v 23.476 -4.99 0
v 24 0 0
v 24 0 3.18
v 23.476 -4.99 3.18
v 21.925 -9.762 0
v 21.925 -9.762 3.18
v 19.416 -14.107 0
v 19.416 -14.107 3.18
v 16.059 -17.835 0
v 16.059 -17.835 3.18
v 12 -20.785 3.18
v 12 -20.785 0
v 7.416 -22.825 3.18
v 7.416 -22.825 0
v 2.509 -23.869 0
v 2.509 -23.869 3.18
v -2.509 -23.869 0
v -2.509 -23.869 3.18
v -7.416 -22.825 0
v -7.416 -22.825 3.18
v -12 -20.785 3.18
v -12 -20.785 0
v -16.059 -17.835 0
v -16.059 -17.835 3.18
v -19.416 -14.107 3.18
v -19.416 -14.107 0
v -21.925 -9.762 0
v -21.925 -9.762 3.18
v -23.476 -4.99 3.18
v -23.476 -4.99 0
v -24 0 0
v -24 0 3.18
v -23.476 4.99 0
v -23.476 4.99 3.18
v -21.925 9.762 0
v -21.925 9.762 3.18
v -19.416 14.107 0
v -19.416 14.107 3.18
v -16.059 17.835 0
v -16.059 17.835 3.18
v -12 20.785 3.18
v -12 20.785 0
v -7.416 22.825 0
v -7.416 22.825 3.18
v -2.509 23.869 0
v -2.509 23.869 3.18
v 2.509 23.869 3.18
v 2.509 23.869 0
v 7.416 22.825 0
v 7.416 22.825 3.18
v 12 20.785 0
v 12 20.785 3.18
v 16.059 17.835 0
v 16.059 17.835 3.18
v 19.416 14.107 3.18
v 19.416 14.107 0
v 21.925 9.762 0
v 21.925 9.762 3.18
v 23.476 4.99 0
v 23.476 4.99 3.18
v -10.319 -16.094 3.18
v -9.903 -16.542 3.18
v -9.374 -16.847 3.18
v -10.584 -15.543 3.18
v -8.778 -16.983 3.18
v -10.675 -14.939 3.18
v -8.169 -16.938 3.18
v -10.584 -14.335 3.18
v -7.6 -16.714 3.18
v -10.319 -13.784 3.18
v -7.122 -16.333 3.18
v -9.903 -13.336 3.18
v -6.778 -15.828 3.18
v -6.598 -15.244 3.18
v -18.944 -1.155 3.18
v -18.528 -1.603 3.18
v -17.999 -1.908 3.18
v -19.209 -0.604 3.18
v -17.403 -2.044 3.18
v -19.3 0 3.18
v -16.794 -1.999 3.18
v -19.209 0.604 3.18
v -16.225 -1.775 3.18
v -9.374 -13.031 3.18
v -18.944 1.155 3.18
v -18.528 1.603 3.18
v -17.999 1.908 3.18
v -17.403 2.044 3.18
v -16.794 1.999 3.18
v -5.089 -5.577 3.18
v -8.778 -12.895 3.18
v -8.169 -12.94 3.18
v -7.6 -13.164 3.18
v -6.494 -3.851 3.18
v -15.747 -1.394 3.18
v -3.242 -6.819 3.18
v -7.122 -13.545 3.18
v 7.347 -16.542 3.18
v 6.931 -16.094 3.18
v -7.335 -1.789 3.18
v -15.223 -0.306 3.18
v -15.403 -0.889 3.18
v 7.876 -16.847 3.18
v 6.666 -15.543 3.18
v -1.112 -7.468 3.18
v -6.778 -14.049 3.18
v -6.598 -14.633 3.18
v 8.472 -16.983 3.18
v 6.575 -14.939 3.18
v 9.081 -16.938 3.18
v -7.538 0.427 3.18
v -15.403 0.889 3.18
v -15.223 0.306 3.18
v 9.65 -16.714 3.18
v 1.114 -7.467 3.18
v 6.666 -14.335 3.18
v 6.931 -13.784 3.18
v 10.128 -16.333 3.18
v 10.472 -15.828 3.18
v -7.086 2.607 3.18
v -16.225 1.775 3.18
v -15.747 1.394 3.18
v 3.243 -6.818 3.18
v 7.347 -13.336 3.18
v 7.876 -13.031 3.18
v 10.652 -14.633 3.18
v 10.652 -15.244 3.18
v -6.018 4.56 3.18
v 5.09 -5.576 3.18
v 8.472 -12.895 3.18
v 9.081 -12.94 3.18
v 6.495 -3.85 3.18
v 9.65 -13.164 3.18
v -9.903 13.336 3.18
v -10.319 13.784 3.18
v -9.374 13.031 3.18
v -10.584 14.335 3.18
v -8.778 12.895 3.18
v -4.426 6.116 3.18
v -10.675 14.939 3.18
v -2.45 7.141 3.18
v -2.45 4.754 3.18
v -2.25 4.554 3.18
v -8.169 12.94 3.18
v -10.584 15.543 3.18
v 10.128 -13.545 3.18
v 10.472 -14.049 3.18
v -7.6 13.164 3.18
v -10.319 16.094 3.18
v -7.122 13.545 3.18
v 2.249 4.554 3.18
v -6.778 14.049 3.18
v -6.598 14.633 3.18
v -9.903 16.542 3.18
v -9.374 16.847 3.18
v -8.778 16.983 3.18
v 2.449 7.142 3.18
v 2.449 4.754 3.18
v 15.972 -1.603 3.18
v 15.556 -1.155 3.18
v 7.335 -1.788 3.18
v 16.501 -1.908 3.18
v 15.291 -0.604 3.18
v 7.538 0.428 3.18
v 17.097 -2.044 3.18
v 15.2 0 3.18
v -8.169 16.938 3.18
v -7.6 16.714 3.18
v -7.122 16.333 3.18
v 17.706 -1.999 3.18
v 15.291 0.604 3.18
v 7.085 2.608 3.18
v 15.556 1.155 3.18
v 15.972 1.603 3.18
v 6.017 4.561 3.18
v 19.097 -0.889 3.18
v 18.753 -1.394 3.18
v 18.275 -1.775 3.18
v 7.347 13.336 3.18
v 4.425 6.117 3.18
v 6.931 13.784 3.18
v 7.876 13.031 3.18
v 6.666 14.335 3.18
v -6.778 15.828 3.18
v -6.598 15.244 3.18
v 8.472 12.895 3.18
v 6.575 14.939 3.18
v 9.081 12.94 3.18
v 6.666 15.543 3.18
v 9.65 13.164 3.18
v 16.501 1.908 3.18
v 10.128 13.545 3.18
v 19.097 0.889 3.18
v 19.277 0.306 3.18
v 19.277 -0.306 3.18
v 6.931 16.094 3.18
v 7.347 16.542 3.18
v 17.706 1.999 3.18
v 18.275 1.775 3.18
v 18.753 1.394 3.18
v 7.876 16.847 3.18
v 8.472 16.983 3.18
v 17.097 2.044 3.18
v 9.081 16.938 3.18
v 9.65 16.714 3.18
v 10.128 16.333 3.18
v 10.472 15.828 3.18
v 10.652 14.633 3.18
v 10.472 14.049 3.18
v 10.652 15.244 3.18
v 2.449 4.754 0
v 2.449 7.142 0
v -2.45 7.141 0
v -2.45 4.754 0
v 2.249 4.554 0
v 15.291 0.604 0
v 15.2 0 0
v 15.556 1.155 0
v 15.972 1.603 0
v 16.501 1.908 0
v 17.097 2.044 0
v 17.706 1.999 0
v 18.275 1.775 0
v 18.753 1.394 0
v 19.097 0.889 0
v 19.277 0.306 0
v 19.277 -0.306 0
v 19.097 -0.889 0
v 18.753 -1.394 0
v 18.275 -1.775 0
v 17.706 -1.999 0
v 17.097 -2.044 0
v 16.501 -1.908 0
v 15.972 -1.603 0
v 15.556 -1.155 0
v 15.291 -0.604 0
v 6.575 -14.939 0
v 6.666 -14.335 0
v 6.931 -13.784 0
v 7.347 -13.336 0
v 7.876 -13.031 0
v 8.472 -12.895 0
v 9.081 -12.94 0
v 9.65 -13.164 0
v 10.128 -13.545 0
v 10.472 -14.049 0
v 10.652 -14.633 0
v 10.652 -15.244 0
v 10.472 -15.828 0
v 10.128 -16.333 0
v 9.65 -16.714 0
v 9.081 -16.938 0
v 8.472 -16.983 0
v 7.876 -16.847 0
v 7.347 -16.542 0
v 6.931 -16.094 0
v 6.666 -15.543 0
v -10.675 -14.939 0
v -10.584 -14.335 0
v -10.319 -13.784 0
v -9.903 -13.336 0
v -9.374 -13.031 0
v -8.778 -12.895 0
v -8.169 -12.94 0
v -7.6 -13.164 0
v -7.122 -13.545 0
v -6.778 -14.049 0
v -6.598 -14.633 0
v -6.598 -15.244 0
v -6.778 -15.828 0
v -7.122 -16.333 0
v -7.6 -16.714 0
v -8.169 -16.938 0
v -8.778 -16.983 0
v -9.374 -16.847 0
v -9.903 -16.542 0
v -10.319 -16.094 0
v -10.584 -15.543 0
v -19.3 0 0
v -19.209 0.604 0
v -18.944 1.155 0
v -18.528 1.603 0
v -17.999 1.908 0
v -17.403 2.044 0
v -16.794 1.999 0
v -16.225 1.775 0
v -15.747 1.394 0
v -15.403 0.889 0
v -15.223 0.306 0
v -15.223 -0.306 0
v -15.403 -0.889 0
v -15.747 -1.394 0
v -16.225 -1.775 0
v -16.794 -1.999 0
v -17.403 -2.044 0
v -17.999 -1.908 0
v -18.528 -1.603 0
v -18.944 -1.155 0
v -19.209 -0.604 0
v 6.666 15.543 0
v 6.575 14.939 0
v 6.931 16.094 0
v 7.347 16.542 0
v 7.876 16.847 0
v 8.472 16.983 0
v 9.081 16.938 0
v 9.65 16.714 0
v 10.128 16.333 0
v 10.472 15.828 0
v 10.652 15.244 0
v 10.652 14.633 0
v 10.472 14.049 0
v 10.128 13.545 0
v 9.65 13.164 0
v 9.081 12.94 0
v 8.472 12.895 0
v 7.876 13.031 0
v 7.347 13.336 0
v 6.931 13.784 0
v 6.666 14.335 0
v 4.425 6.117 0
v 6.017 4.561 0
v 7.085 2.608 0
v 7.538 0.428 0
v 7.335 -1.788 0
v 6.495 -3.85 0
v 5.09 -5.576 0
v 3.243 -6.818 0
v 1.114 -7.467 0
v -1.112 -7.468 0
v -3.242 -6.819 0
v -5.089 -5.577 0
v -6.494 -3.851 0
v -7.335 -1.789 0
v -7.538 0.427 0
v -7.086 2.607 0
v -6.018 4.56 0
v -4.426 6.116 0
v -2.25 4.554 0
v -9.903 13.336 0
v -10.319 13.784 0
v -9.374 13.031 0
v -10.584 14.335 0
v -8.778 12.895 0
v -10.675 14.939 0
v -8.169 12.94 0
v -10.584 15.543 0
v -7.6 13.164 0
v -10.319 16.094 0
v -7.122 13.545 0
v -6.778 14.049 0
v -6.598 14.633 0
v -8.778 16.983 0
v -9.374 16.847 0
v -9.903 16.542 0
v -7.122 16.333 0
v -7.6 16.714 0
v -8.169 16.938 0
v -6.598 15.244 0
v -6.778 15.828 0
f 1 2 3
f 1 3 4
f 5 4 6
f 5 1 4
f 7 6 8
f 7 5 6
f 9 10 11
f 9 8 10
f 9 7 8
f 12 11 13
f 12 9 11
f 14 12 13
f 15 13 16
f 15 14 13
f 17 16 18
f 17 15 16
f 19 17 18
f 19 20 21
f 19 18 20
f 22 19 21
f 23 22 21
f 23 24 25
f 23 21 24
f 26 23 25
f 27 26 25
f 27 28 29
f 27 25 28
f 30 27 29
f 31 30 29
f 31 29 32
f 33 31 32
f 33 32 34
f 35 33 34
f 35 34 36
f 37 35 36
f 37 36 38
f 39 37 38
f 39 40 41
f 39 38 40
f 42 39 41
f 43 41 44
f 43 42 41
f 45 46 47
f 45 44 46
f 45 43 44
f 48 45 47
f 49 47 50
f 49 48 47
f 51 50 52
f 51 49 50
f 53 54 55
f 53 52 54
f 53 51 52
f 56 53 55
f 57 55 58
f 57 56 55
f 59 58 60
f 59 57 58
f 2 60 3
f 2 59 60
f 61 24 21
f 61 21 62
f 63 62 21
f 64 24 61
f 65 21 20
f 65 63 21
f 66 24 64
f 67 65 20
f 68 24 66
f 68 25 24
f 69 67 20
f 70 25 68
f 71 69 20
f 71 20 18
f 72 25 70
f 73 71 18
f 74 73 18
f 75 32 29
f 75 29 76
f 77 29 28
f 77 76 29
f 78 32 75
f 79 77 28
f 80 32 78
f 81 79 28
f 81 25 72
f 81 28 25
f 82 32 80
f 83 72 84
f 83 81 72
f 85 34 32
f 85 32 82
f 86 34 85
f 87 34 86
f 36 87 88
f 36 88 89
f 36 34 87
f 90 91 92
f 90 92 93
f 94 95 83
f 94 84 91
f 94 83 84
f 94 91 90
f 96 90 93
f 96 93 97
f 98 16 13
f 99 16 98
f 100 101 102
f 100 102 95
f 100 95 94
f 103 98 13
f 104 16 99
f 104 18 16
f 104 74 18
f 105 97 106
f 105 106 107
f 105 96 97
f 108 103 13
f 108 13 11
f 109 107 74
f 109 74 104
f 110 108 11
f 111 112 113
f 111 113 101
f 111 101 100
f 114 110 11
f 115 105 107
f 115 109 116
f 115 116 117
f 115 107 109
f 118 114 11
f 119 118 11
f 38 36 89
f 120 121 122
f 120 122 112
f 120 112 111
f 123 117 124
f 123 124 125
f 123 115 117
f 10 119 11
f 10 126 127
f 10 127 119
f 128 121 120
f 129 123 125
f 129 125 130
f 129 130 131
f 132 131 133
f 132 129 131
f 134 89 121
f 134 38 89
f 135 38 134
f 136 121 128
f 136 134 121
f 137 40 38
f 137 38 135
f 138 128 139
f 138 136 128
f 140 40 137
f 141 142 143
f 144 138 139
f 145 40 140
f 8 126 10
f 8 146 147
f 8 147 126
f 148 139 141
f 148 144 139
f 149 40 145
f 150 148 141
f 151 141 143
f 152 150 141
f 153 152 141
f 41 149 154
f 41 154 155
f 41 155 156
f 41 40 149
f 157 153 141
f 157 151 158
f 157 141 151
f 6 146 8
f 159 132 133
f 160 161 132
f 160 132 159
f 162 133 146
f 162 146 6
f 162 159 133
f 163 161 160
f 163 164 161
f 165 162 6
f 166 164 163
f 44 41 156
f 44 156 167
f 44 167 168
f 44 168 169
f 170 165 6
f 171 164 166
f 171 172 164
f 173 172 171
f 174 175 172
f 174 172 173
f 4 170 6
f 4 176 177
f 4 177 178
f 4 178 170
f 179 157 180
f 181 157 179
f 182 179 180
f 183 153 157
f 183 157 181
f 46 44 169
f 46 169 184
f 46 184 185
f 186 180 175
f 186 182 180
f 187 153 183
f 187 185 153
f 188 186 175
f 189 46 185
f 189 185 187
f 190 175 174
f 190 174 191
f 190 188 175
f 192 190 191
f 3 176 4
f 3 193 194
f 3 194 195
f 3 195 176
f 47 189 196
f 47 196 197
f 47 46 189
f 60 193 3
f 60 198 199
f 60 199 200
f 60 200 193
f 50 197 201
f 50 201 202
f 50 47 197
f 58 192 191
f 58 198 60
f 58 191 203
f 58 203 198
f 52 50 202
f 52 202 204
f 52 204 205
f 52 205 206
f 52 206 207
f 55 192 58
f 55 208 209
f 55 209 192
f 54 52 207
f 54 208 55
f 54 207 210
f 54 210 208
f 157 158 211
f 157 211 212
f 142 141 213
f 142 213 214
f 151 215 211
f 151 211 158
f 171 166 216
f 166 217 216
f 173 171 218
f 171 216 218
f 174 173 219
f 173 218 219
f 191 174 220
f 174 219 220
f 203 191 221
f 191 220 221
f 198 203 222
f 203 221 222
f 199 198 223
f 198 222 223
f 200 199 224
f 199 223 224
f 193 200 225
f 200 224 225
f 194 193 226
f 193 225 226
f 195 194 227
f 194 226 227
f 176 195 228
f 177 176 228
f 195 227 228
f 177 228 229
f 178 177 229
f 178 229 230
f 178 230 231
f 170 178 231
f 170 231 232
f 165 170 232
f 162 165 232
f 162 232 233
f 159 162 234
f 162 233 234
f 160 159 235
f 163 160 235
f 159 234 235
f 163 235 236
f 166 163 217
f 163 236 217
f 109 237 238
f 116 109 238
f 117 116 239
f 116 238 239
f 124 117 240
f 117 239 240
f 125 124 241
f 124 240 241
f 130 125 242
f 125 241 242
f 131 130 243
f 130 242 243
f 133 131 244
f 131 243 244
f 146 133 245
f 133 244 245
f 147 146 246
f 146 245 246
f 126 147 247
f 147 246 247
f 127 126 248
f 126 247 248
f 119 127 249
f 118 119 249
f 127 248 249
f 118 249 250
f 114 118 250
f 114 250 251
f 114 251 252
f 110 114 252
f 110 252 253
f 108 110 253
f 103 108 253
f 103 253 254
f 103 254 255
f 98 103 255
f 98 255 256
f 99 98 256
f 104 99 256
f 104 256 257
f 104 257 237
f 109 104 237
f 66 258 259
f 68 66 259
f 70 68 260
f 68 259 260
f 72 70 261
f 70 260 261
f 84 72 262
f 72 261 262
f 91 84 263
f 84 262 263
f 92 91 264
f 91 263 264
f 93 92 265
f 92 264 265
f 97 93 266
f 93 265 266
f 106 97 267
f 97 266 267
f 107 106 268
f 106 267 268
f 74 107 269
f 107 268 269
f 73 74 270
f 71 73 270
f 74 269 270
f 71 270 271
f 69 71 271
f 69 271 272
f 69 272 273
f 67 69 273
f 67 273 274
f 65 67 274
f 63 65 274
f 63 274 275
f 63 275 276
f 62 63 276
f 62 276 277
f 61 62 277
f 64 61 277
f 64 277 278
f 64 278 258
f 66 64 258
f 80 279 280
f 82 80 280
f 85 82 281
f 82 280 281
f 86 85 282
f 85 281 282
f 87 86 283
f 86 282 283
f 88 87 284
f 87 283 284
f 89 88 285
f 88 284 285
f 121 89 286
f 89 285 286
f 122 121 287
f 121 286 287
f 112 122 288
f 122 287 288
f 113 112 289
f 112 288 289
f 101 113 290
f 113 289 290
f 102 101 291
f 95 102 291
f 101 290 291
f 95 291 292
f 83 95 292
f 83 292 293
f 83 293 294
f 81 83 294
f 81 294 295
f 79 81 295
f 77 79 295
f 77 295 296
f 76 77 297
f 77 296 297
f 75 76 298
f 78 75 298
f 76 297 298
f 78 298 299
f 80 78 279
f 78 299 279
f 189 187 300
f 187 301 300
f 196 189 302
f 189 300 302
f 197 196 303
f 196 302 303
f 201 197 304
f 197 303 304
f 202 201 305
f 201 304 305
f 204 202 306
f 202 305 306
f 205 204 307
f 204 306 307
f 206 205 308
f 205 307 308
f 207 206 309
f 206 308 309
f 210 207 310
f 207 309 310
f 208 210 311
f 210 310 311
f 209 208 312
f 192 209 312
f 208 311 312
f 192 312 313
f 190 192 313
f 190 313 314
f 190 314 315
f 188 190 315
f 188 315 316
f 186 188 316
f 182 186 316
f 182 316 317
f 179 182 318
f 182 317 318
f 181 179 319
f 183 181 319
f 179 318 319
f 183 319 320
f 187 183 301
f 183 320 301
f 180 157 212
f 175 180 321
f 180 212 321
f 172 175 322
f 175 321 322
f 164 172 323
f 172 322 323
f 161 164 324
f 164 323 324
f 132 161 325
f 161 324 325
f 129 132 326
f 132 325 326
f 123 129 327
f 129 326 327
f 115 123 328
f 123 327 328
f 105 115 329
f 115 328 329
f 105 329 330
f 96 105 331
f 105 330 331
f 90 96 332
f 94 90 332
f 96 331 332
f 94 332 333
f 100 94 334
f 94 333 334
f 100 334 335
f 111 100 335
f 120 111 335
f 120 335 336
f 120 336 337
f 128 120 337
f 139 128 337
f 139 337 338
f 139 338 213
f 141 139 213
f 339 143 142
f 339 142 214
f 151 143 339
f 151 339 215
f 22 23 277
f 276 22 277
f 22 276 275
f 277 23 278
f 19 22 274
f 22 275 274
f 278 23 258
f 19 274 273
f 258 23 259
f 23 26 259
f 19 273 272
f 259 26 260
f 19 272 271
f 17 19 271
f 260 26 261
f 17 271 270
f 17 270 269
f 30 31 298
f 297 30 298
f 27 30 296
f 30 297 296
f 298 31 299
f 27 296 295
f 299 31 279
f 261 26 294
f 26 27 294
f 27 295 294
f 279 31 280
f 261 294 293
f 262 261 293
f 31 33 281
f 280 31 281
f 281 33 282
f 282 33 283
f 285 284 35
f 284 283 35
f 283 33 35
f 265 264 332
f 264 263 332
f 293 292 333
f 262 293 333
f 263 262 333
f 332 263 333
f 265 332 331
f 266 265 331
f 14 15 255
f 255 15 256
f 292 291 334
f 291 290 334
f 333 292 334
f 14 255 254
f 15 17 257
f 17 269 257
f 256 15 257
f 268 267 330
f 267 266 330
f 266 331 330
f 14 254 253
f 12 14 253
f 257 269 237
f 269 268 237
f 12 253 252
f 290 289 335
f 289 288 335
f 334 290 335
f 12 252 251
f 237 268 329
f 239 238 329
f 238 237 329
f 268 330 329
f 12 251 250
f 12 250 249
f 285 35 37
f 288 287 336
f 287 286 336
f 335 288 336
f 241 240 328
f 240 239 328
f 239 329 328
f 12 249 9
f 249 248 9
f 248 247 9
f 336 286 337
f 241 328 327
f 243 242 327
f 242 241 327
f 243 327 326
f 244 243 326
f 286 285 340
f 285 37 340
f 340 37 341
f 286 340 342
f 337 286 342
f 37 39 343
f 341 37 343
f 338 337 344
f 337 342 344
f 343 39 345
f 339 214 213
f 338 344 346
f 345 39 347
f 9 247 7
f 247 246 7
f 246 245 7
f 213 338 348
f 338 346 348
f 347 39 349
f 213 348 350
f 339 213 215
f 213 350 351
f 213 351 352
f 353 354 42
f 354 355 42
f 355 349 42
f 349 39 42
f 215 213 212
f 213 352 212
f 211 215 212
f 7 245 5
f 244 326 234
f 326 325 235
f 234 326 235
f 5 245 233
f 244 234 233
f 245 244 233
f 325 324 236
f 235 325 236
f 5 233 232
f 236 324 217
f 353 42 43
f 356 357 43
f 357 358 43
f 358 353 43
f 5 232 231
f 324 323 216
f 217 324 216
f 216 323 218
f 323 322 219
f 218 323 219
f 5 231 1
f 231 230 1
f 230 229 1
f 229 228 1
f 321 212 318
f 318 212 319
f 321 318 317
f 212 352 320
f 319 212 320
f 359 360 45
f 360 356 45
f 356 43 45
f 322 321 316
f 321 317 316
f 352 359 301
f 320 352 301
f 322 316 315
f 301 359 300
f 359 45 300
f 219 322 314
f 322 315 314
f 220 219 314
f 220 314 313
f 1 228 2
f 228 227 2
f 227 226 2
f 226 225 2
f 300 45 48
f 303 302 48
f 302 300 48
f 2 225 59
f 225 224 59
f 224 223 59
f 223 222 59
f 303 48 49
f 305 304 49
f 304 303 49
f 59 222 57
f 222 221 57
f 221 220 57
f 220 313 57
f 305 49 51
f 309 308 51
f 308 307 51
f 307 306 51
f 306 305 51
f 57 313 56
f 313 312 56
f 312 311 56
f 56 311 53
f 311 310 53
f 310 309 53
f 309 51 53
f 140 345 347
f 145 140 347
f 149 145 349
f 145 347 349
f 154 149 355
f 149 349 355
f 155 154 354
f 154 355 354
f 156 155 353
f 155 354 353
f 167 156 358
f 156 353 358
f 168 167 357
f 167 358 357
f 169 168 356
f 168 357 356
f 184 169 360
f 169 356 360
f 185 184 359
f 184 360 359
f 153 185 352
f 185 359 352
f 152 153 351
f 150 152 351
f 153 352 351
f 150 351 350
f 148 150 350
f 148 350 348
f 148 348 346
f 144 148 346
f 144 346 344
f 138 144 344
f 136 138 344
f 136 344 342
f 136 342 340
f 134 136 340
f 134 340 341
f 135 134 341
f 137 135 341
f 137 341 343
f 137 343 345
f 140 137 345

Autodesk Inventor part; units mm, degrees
ref_plane "YZ Plane" through (0, 0, 0) normal (1, 0, 0) x (0, 1, 0)
ref_plane "XZ Plane" through (0, 0, 0) normal (0, 1, 0) x (-1, 0, 0)
ref_plane "XY Plane" through (0, 0, 0) normal (0, 0, 1) x (1, 0, 0)
sketch "Sketch1" plane through (0, 0, 0) normal (0, 0, 1) x (1, 0, 0)
  circle A0 centre (0, 0) radius 24
  circle A1 centre (0, 0) radius 7.55
  dimension "d0" = 48
  dimension "d1" = 15.1
extrude "Extrusion1" add sketch "Sketch1" along normal blind 3.18
sketch "Sketch2" plane through (0, 0, 0) normal (0, 0, -1) x (-1, 0, 0)
  circle A0 centre (-16.5319, -11.256) radius 2.05 projected
  circle A1 centre (-19.649, 3.7306) radius 2.05 projected
  circle A2 centre (-17.0544, -2.5903) radius 1.65 projected
  circle A3 centre (-6.284, -16.0647) radius 1.65 projected
  circle A4 centre (-6.284, -16.0647) radius 1.65
  circle A5 centre (0, 0) radius 7.55 projected
  line L0 (0, 0) -> (0, -29.2074)
  line L1 (0, 0) -> (-14.8823, -25.7769)
  circle A6 centre (0, 0) radius 17.25
  circle A7 centre (-8.625, -14.9389) radius 2.05
  circle A8 centre (8.625, -14.9389) radius 2.05
  circle A9 centre (17.25, 0) radius 2.05
  circle A10 centre (8.625, 14.9389) radius 2.05
  circle A11 centre (-8.625, 14.9389) radius 2.05
  circle A12 centre (-17.25, 0) radius 2.05
  dimension "d26" = 30
  dimension "d27" = 4.1
  dimension "d30" = 360
extrude "Extrusion2" cut sketch "Sketch2" against normal through all contours A12 A6 A2 | A2 A6 A12 | A6 A12 A2 | A2 A12 A6 | A7 L1 A6 | A6 L1 A7 | A6 A3 A7 L1 | L1 A7 A3 A6 | A11 A6 | A6 A11 | A6 A7 A3 | A3 A7 A6 | A10 A6 | A6 A10 | A8 A6 | A6 A8 | A9 A6 | A6 A9 picked at (-16.7628, -1.5642) picked at (-16.3049, -0.3328) picked at (-17.5539, -1.6273) picked at (-18.131, -0.5464) picked at (-7.3677, -16.0157) picked at (-7.0171, -15.2489)
sketch "Sketch3" plane through (0, 0, 3.18) normal (0, 0, 1) x (1, 0, 0)
  line L0 (-2.5, 4.5) -> (-2.5, 7.0711)
  arc A0 (-2.5, 7.0711) -> (2.5, 7.0711) centre (0, 0) ccw
  line L1 (2.5, 7.0711) -> (2.5, 4.5)
  line L2 (2.5, 4.5) -> (-2.5, 4.5)
  line L3 (-2.4503, 4.5542) -> (2.4493, 4.5542)
  line L4 (2.4493, 4.5542) -> (2.4493, 8.0911)
  line L5 (2.4493, 8.0911) -> (-2.4503, 8.0911)
  line L6 (-2.4503, 8.0911) -> (-2.4503, 4.5542)
  circle A1 centre (0, 0) radius 7.55 projected
  dimension "d16" = 7.5
  dimension "d17" = 5
  dimension "d18" = 2.9958
extrude "Extrusion3" add sketch "Sketch3" against normal up to surface (3.18 mm away) contours L6 A1 L4 L3 | L6 L5 L4 A1 picked at (-0.2772, 5.5375)
chamfer "Chamfer1" distance 0.2 angle 45 2 edges at (-2.4503, 4.5542, 1.59) (2.4493, 4.5542, 1.59)
properties part number "spool_spacer_driver"
